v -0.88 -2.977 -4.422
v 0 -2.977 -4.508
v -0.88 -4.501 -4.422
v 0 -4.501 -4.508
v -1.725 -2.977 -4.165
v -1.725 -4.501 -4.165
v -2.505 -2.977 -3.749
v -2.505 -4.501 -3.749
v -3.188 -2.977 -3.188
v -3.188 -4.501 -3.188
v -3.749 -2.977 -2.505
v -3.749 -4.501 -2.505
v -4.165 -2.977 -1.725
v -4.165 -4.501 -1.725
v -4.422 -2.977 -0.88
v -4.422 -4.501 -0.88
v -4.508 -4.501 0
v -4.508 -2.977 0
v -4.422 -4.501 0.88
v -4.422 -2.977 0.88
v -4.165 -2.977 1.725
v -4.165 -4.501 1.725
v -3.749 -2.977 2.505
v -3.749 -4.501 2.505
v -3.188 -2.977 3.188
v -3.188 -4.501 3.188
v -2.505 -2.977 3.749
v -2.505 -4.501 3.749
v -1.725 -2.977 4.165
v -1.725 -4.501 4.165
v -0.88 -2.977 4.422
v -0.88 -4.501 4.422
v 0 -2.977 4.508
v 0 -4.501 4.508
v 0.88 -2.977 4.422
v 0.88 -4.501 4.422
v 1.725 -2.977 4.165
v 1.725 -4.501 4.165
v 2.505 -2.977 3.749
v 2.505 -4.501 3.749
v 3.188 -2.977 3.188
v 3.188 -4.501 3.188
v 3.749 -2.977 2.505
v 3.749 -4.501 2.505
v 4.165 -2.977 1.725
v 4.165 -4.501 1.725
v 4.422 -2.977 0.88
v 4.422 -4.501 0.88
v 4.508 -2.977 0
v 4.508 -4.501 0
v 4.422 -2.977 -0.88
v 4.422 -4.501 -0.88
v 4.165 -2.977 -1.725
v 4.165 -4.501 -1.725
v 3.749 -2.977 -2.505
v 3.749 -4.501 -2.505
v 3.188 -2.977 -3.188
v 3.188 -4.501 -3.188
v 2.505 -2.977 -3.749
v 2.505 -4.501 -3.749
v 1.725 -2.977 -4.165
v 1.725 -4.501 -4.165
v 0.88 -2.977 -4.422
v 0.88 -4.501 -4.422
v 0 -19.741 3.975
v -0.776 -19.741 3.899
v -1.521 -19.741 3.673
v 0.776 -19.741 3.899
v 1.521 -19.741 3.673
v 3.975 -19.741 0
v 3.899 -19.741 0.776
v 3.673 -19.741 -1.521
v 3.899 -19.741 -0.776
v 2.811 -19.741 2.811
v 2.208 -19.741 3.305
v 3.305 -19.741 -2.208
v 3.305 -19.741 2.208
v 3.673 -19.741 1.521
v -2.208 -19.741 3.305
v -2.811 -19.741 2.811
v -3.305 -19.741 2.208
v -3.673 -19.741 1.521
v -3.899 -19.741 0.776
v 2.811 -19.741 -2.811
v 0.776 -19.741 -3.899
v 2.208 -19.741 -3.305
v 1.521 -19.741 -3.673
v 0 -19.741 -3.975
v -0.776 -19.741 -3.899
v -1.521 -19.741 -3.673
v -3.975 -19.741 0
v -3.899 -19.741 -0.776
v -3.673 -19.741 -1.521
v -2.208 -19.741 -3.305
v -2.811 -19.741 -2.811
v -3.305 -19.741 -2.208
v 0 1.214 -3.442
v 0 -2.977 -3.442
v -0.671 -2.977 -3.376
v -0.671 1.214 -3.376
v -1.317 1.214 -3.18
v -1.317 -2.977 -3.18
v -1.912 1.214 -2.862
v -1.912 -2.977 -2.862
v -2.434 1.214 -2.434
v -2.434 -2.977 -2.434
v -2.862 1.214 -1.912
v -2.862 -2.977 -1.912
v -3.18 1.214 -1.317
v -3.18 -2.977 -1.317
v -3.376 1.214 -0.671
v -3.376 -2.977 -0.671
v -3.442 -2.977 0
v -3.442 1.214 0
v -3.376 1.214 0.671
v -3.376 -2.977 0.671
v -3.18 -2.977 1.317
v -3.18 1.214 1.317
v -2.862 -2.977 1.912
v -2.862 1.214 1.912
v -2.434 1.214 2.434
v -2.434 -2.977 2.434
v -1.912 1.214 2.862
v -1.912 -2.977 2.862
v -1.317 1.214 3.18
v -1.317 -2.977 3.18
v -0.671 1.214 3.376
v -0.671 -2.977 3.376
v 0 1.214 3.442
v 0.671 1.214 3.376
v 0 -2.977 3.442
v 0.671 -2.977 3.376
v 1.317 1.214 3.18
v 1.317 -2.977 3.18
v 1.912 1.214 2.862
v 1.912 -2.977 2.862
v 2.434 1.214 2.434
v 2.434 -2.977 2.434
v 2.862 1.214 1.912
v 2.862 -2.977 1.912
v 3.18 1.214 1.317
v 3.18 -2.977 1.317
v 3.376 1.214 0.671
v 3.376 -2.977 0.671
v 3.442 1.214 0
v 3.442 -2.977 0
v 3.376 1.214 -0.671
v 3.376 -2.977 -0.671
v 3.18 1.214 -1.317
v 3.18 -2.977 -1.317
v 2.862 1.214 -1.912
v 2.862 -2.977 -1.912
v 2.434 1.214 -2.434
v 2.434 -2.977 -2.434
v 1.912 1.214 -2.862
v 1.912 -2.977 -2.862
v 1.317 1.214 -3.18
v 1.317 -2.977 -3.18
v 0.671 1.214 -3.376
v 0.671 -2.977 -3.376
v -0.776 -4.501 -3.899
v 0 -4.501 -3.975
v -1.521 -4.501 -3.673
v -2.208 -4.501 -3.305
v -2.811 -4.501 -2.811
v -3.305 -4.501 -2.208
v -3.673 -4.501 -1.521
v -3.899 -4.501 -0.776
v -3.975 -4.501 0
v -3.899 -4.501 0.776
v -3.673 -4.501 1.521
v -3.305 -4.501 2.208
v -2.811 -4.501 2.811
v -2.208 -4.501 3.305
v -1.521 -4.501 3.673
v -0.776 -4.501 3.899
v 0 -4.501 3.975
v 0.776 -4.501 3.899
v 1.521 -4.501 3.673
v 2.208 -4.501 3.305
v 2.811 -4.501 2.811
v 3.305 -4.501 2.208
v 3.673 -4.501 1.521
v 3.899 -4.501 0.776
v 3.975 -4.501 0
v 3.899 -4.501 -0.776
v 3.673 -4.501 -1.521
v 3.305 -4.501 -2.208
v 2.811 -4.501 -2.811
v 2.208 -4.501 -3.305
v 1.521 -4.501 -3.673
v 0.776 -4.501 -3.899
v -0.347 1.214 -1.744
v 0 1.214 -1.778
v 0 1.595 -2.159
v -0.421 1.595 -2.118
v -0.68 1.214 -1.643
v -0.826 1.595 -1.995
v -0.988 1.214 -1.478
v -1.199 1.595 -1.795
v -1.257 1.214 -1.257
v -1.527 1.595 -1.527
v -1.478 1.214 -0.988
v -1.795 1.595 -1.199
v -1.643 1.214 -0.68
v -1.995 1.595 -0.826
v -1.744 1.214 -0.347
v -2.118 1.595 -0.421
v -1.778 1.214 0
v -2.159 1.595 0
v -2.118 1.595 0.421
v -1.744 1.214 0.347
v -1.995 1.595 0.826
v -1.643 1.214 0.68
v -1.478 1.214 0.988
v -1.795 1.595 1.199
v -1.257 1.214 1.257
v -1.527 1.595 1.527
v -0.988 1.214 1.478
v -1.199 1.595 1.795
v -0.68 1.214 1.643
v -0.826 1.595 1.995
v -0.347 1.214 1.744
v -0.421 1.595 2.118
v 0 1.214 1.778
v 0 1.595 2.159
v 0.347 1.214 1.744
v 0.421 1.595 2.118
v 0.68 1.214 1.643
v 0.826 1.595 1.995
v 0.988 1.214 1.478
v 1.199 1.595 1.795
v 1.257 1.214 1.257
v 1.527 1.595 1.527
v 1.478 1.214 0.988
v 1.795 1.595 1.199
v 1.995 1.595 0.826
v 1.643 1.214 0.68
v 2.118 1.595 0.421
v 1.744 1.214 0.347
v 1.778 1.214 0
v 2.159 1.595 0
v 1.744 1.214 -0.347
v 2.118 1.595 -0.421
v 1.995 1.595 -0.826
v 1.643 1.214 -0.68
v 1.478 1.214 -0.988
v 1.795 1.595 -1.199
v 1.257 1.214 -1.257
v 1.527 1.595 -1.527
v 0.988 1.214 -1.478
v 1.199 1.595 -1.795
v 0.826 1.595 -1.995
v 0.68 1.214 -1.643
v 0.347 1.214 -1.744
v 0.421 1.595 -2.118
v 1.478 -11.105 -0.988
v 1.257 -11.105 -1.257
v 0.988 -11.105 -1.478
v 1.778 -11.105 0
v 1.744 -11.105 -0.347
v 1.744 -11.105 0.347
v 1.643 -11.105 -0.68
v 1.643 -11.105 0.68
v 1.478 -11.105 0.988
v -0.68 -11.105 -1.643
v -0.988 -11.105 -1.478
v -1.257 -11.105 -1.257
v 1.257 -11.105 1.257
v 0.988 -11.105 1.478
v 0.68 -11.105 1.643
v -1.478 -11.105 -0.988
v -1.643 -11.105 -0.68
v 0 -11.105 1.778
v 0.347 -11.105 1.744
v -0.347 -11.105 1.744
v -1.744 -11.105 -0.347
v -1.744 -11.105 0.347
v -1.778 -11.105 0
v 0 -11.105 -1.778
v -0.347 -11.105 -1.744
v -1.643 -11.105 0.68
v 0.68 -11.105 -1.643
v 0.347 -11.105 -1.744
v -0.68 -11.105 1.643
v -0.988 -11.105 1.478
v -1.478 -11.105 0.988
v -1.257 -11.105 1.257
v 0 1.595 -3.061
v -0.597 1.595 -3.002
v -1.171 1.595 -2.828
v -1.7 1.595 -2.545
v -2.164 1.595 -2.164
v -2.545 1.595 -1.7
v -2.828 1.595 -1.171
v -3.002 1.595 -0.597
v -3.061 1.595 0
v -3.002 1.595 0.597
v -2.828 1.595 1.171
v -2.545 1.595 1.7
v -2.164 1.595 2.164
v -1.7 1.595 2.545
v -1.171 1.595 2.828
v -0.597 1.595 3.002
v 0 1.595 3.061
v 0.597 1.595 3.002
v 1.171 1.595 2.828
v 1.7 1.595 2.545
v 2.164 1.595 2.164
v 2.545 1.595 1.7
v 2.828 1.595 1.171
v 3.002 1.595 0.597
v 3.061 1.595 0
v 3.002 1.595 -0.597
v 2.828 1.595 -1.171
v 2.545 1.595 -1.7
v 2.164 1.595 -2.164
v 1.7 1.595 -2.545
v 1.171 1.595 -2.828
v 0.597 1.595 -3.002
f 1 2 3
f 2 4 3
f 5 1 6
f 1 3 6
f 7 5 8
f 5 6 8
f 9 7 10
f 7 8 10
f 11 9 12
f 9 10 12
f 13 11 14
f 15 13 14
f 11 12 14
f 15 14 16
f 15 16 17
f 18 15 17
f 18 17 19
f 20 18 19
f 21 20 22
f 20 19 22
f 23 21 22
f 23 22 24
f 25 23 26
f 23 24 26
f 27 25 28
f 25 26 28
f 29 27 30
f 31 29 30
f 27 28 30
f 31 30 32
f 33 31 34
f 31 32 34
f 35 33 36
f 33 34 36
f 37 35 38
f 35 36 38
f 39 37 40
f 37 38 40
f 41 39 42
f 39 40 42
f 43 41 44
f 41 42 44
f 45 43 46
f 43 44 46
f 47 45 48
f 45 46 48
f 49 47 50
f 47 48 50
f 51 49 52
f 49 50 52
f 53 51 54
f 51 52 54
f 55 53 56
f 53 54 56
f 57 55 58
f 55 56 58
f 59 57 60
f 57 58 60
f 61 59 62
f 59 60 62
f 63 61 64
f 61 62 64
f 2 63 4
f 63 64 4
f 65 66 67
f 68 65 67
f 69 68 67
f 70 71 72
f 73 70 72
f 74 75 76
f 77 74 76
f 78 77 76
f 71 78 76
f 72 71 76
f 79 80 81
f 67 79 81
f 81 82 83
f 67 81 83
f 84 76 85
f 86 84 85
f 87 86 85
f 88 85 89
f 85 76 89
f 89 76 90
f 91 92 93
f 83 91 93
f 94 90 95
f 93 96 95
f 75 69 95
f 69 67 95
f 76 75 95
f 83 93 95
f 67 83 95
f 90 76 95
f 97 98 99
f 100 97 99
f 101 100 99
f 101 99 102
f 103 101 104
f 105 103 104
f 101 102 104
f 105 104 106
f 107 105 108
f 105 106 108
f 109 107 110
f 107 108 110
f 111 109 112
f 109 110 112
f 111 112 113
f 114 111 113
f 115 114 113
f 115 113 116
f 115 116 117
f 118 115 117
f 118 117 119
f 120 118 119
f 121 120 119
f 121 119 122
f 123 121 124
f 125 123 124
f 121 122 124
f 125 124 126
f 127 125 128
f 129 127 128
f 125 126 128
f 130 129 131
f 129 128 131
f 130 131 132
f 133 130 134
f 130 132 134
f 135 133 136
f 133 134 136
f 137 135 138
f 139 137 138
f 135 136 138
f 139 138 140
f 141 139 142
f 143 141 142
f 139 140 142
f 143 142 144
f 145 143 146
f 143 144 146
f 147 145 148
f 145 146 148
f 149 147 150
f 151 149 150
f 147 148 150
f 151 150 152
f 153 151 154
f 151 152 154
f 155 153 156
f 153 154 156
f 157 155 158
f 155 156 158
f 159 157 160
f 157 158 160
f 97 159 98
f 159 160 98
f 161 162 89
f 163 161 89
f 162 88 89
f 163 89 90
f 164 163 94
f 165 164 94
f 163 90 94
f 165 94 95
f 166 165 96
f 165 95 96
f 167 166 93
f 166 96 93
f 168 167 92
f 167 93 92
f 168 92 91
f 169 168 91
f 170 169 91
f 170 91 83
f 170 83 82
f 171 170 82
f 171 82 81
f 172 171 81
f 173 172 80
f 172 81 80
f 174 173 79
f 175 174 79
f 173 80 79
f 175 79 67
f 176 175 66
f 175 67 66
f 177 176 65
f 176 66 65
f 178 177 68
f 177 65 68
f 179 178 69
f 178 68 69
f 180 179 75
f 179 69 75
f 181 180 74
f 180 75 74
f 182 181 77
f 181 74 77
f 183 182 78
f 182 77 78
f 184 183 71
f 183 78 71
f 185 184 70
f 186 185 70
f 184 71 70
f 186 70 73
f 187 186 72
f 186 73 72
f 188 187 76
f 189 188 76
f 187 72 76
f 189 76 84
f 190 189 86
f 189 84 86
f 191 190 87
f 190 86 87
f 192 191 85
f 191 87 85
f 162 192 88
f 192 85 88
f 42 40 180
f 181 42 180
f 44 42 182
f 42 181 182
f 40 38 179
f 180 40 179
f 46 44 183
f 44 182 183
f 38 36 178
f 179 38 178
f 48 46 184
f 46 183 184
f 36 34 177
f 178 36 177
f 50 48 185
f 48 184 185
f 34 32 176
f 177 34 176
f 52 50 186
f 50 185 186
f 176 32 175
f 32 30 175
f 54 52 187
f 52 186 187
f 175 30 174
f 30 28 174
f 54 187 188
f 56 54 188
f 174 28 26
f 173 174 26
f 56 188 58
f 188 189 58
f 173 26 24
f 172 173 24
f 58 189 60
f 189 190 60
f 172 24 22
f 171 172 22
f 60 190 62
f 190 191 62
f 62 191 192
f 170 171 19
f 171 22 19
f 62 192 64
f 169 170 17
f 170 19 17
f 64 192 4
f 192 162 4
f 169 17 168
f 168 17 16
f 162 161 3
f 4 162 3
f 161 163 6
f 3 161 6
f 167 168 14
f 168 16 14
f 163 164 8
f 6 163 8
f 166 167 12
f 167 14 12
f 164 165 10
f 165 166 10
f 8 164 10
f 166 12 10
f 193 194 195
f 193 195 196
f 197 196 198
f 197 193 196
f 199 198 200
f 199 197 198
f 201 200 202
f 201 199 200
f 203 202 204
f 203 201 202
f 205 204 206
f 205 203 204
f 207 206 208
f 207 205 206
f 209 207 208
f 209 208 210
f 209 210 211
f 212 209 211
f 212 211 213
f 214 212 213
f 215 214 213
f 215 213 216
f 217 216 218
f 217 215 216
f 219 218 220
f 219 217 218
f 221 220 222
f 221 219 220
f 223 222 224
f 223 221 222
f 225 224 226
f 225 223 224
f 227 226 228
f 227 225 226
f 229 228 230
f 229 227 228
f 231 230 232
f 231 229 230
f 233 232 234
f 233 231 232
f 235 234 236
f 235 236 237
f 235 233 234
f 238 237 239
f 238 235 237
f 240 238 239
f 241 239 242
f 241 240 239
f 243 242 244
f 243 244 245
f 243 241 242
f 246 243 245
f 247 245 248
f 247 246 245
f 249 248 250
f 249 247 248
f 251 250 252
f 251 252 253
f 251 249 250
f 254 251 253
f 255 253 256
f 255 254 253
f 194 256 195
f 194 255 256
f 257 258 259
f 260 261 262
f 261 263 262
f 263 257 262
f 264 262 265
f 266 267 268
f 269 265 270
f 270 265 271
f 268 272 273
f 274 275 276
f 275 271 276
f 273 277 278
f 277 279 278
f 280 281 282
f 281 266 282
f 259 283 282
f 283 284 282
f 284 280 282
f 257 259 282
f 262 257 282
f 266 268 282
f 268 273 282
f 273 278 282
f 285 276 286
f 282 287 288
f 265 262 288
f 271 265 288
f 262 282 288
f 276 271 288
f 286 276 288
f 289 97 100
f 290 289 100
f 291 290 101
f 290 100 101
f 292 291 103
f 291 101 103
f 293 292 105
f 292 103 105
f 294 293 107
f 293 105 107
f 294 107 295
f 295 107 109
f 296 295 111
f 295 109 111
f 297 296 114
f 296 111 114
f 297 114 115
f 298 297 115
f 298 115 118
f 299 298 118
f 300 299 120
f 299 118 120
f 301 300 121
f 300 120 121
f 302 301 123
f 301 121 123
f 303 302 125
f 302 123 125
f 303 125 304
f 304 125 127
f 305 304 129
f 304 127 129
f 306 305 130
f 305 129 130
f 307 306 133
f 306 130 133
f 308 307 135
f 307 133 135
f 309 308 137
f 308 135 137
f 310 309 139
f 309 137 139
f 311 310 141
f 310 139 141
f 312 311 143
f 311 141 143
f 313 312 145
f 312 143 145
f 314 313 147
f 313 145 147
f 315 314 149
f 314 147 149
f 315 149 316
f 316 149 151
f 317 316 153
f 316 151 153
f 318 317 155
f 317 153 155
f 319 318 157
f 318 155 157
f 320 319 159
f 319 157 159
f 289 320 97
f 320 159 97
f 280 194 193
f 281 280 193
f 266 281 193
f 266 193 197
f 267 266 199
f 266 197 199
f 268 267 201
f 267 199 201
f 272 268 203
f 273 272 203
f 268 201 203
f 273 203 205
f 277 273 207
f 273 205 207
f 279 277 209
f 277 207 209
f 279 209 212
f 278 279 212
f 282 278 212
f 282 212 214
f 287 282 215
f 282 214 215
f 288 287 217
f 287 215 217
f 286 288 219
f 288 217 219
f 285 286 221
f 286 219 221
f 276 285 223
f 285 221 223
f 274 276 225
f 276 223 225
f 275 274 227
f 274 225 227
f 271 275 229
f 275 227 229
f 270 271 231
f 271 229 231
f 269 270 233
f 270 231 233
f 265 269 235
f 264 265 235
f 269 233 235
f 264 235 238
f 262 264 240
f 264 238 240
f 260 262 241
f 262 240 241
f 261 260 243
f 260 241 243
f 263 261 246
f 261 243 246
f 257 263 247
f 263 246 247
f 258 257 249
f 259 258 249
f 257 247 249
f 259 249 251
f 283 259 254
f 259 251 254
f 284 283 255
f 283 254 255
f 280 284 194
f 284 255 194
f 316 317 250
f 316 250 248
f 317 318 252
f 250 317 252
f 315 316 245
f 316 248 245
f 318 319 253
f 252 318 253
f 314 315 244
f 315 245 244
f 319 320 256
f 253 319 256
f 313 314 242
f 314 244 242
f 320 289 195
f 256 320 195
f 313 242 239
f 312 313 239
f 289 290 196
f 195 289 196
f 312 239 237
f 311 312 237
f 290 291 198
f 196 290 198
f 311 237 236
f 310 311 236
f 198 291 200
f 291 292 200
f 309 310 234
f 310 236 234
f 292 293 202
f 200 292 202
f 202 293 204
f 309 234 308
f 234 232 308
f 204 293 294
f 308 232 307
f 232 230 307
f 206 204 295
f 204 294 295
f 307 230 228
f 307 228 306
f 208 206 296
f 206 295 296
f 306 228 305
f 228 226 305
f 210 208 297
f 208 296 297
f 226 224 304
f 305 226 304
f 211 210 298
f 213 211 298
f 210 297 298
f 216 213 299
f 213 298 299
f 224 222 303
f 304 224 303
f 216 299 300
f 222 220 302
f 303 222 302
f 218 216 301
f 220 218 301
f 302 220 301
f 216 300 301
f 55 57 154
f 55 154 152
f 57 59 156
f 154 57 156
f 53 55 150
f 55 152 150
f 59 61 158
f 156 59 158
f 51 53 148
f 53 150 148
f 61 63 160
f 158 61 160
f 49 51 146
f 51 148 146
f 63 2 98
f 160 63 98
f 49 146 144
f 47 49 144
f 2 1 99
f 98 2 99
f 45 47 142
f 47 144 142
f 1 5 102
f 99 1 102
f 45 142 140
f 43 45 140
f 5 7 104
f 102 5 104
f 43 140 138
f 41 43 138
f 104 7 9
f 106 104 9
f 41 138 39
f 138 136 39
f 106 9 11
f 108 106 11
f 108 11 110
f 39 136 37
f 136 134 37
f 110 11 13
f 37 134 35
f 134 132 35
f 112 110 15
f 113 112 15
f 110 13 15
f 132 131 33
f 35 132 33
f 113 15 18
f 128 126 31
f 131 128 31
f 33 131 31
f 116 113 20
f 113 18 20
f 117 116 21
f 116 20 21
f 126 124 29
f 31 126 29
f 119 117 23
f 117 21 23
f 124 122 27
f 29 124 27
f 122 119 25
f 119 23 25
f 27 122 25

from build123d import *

# Parameters (mm, degrees)
CHAMFER1_SIZE = 0.381


with BuildPart() as part:
    # Sketch1 → Revolve1 (revolve)
    with BuildSketch(Plane.XY):
        Polygon((-1.778, 1.595281863), (-3.4417, 1.595281863), (-3.4417, -2.976718137), (-4.5085, -2.976718137), (-4.5085, -4.500718137), (-3.9751, -4.500718137), (-3.9751, -19.740718137), (0, -19.740718137), (0, -11.104718137), (-1.778, -11.104718137), align=None)
    revolve(axis=Axis((0, -11.104718137, 0), (0, 1, 0)))

    # Chamfer1
    chamfer1_edges = [part.edges().sort_by_distance(p)[0] for p in [
        (3.4417, 1.595281863, 0),
        (1.778, 1.595281863, 0),
    ]]
    chamfer(chamfer1_edges, length=CHAMFER1_SIZE)


solid = part.part
